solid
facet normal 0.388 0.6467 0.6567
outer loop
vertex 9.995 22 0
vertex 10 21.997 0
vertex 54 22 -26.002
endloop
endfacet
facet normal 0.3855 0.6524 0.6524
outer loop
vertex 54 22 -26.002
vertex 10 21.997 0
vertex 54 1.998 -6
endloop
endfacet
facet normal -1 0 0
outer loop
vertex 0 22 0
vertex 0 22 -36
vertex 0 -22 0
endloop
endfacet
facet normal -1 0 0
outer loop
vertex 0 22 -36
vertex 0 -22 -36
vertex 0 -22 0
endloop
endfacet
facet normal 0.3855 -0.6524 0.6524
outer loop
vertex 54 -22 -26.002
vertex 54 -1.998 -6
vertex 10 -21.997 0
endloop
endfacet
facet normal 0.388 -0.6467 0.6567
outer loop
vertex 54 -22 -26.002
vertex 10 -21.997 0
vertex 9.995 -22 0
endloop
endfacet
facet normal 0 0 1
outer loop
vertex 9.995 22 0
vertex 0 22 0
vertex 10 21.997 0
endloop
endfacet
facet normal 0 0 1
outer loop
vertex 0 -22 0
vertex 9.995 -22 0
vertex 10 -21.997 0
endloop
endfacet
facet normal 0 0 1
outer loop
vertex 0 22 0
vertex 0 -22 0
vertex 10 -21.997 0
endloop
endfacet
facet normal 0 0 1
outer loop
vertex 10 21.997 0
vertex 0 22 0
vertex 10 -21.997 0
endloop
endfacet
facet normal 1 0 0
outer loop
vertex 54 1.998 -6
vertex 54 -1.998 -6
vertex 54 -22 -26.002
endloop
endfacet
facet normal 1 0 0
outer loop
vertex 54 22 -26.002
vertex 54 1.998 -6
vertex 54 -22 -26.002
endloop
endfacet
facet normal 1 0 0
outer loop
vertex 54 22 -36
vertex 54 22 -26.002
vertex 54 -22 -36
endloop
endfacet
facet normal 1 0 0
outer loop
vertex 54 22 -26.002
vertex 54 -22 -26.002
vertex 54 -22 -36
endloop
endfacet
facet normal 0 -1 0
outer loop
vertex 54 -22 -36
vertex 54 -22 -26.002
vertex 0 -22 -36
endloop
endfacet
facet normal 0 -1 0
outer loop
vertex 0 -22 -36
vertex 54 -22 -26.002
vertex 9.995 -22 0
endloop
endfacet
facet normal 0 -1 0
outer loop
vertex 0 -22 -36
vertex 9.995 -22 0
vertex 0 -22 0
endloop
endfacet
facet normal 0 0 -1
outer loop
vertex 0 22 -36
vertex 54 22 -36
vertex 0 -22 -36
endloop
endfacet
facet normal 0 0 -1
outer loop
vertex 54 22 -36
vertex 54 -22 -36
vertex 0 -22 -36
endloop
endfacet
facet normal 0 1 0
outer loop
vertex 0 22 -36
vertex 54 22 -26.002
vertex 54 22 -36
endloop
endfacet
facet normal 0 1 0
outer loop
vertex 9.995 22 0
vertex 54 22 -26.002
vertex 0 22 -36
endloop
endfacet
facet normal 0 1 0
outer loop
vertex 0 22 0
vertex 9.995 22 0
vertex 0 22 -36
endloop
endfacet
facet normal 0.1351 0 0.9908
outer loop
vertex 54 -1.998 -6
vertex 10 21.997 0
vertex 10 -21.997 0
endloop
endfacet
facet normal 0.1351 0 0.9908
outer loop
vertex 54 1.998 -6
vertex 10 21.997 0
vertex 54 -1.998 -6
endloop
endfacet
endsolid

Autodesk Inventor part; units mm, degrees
ref_plane "YZ Plane" through (0, 0, 0) normal (1, 0, 0) x (0, 1, 0)
ref_plane "XZ Plane" through (0, 0, 0) normal (0, 1, 0) x (-1, 0, 0)
sketch "草圖1" plane through (0, 0, 0) normal (0, 1, 0) x (-1, 0, 0)
  line L0 (0, 0) -> (-54, 0)
  line L1 (-54, 0) -> (-54, -36)
  line L2 (-54, -36) -> (0, -36)
  line L3 (0, -36) -> (0, 0)
  dimension "d0" = 54
  dimension "d1" = 36
extrude "擠出1" add sketch "草圖1" along normal mid plane 44
sketch "草圖2" plane through (0, 22, 0) normal (0, 1, 0) x (1, 0, 0)
  line L0 (0, 0) -> (54, 0) projected
  line L1 (10, 0) -> (54, 6)
  line L2 (54, 0) -> (54, 36) projected
  dimension "d4" = 10
  dimension "d5" = 30
extrude "擠出2" cut sketch "草圖2" against normal blind 60
sketch "草圖3" plane through (54, -22, -36) normal (1, 0, 0) x (0, 0, -1)
  line L0 (-30, 24) -> (-10, 44)
  line L1 (0, 44) -> (-36, 44) projected
  line L2 (-30, 44) -> (-30, 0) projected
  point P0 (-36, 22)
  point P1 (-30, 2)
  dimension "d8" = 20
  dimension "d9" = 20
ref_plane "工作平面1" through (10, 22, 0) normal (-0.3855, -0.6524, -0.6524) x (0.8609, 0, -0.5087)
sketch "草圖4" plane through (10, 22, 0) normal (-0.3855, -0.6524, -0.6524) x (0.8609, 0, -0.5087)
  line L0 (-15.1543, -12.3218) -> (93.717, -12.3218)
  line L1 (93.717, -12.3218) -> (93.717, 28.8166)
  line L2 (93.717, 28.8166) -> (-15.1543, 28.8166)
  line L3 (-15.1543, 28.8166) -> (-15.1543, -12.3218)
  point P0 (-8.6093, 13.3533)
extrude "擠出3" cut sketch "草圖4" against normal blind 40
mirror "鏡射1" about plane through (0, 0, 0) normal (0, 1, 0) of "擠出3"
properties part number "46"
